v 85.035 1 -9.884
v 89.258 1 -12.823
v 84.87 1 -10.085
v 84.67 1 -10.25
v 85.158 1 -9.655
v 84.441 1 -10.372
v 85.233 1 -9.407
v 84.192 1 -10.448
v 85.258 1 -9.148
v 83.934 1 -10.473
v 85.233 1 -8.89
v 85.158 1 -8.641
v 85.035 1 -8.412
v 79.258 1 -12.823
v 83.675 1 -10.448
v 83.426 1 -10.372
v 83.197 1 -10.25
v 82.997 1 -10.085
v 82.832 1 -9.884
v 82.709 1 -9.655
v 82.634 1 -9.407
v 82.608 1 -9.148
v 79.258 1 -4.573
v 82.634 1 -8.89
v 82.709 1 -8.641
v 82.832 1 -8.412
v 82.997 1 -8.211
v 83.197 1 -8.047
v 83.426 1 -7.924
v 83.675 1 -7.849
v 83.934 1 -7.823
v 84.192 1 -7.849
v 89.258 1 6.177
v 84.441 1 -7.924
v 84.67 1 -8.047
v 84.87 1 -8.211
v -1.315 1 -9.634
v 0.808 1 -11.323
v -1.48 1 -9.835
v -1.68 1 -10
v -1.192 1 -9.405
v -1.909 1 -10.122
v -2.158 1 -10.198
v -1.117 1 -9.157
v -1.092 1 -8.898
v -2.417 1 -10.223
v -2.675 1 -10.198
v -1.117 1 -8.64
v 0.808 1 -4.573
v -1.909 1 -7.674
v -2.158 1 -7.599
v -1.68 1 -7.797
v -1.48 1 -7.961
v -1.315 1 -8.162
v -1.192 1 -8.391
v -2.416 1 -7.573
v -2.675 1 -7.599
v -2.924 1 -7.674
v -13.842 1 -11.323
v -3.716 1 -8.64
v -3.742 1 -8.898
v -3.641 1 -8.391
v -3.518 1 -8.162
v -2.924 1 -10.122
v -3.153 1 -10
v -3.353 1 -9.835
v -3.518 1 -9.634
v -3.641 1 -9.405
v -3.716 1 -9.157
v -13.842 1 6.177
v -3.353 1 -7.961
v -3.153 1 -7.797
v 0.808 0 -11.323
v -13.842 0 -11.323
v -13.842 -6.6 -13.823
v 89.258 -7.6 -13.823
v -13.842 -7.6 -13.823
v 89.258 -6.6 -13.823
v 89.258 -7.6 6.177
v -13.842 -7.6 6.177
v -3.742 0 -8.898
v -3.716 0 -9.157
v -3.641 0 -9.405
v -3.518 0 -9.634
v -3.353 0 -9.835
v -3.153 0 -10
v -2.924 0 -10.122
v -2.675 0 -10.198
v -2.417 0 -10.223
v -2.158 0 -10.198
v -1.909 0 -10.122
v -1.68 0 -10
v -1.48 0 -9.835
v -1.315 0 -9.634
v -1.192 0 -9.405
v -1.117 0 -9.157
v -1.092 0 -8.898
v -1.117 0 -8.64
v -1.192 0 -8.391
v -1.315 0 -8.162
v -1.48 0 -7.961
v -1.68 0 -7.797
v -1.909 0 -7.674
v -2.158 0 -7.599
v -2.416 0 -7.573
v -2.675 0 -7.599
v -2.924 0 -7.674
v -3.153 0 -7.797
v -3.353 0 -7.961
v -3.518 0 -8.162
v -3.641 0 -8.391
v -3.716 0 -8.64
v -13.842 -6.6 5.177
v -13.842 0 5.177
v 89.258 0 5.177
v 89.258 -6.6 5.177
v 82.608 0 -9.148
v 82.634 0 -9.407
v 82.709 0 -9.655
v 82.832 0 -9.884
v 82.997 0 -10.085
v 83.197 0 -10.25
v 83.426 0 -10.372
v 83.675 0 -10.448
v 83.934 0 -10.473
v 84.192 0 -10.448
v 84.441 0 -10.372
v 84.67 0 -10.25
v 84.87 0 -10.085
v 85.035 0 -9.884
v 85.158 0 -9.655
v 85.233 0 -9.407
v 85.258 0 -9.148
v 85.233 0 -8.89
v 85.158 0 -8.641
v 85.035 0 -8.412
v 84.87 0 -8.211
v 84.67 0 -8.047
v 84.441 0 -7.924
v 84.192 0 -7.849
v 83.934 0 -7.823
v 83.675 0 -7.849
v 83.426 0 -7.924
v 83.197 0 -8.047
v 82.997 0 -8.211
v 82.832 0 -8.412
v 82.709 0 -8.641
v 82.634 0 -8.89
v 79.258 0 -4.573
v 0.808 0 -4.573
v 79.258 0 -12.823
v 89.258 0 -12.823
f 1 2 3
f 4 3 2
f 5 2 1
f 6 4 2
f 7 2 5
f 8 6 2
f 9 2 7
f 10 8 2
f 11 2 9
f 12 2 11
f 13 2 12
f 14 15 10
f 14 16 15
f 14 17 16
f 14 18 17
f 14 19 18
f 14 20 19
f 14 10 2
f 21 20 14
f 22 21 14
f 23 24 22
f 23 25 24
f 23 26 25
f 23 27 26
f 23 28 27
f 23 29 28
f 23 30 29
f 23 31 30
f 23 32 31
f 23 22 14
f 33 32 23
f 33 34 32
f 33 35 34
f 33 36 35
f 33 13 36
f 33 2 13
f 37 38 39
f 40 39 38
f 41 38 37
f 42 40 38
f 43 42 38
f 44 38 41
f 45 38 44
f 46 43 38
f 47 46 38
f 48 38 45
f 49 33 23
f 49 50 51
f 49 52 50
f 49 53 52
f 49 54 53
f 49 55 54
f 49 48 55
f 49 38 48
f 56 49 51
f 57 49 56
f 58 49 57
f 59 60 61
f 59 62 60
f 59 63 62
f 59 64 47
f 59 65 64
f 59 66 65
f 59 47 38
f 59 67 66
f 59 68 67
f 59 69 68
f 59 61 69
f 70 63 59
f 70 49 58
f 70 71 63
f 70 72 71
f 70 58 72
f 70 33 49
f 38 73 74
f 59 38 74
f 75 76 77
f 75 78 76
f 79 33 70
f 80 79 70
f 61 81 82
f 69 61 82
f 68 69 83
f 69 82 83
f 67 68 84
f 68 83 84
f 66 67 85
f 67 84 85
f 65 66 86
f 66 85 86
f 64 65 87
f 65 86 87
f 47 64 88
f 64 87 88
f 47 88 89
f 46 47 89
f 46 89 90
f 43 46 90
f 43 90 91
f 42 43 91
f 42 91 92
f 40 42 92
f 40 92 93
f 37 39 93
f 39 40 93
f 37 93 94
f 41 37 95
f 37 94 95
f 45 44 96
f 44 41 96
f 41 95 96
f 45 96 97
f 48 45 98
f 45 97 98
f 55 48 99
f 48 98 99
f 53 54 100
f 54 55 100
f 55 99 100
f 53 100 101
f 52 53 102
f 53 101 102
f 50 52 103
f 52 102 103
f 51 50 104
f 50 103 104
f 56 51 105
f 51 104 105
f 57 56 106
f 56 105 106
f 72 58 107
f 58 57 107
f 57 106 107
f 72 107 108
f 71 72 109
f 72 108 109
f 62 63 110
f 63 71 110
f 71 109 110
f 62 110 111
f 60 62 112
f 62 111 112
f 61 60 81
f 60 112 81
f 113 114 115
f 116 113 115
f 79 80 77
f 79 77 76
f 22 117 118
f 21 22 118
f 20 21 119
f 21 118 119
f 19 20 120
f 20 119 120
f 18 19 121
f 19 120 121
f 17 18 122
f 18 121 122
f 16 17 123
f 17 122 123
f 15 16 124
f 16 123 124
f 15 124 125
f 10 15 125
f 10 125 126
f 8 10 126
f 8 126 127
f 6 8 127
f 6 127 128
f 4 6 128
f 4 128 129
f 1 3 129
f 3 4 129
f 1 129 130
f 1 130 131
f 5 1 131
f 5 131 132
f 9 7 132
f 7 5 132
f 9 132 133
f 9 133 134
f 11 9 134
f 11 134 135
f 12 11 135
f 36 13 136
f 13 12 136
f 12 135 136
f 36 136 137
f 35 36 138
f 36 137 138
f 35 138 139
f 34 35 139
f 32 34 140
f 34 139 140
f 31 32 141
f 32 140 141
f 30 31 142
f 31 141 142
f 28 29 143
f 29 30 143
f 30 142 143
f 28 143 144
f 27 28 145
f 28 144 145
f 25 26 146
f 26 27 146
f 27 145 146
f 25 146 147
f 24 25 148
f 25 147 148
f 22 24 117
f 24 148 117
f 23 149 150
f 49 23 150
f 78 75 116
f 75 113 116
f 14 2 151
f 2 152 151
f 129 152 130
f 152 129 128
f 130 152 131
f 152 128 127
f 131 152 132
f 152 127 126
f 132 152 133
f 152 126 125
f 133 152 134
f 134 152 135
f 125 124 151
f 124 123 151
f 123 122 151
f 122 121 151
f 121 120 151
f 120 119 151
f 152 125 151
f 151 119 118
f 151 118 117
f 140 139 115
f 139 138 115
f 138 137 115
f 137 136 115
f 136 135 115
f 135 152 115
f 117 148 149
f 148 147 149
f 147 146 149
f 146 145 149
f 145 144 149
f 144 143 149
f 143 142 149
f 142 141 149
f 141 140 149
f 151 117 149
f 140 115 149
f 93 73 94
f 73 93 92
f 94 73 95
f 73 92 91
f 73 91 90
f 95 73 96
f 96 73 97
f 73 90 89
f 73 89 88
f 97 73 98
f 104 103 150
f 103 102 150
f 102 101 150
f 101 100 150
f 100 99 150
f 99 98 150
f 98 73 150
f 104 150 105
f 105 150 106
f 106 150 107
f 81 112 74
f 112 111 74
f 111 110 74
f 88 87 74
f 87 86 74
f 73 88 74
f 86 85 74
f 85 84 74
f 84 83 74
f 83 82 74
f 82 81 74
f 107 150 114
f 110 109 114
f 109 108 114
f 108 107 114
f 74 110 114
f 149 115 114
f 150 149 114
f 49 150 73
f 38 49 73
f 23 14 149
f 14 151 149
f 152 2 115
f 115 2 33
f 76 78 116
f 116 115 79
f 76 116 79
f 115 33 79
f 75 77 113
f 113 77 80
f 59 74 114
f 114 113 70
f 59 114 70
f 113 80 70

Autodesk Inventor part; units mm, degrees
ref_plane "YZ Plane" through (0, 0, 0) normal (1, 0, 0) x (0, 1, 0)
ref_plane "XZ Plane" through (0, 0, 0) normal (0, 1, 0) x (-1, 0, 0)
ref_plane "XY Plane" through (0, 0, 0) normal (0, 0, 1) x (1, 0, 0)
sketch "Sketch1" plane through (0, 0, 0) normal (0, 1, 0) x (-1, 0, 0)
  line L0 (13.8415, 5.1768) -> (-89.2585, 5.1768)
  line L1 (-89.2585, 5.1768) -> (-89.2585, -12.8232)
  line L2 (-89.2585, -12.8232) -> (-79.2585, -12.8232)
  line L3 (-79.2585, -12.8232) -> (-79.2585, -4.5732)
  line L4 (-79.2585, -4.5732) -> (-0.8085, -4.5732)
  line L5 (-0.8085, -4.5732) -> (-0.8085, -11.3232)
  line L6 (-0.8085, -11.3232) -> (13.8415, -11.3232)
  line L7 (13.8415, -11.3232) -> (13.8415, 5.1768)
  circle A0 centre (2.4165, -8.8982) radius 1.325
  circle A1 centre (-83.9335, -9.1482) radius 1.325
  line L8 (13.8415, 5.1768) -> (-89.2585, 5.1768)
  line L9 (-89.2585, 5.1768) -> (-89.2585, 6.1768)
  line L10 (-89.2585, 6.1768) -> (13.8415, 6.1768)
  line L11 (13.8415, 6.1768) -> (13.8415, 5.1768)
  point P0 (0, 0)
  dimension "d0" = 2.65
  dimension "d1" = 2.65
  dimension "d2" = 103.1
  dimension "d3" = 14.65
  dimension "d4" = 10
  dimension "d5" = 18
  dimension "d6" = 16.5
  dimension "d7" = 14.075
  dimension "d8" = 11.425
  dimension "d9" = 9.75
  dimension "d10" = 14.325
  dimension "d11" = 5.325
  dimension "d14" = 1
extrude "Extrusion1" add sketch "Sketch1" along normal blind 1
extrude "Extrusion2" add sketch "Sketch1" against normal blind 7.6 contours L0 L9 L10 L11
sketch "Sketch3" plane through (89.2585, 0, 5.1768) normal (0, 0, -1) x (-1, 0, 0)
  line L0 (103.1, -7.6) -> (0, -7.6) projected
  line L1 (103.1, -7.6) -> (103.1, 1) projected
  line L2 (0, -7.6) -> (103.1, -7.6)
  line L3 (103.1, -7.6) -> (103.1, -6.6)
  line L4 (103.1, -6.6) -> (0, -6.6)
  line L5 (0, -6.6) -> (0, -7.6)
  point P0 (89.2585, 0)
  dimension "d17" = 1
extrude "Extrusion3" add sketch "Sketch3" along normal blind 19
properties part number "CO-1-01-jetsonMount"
